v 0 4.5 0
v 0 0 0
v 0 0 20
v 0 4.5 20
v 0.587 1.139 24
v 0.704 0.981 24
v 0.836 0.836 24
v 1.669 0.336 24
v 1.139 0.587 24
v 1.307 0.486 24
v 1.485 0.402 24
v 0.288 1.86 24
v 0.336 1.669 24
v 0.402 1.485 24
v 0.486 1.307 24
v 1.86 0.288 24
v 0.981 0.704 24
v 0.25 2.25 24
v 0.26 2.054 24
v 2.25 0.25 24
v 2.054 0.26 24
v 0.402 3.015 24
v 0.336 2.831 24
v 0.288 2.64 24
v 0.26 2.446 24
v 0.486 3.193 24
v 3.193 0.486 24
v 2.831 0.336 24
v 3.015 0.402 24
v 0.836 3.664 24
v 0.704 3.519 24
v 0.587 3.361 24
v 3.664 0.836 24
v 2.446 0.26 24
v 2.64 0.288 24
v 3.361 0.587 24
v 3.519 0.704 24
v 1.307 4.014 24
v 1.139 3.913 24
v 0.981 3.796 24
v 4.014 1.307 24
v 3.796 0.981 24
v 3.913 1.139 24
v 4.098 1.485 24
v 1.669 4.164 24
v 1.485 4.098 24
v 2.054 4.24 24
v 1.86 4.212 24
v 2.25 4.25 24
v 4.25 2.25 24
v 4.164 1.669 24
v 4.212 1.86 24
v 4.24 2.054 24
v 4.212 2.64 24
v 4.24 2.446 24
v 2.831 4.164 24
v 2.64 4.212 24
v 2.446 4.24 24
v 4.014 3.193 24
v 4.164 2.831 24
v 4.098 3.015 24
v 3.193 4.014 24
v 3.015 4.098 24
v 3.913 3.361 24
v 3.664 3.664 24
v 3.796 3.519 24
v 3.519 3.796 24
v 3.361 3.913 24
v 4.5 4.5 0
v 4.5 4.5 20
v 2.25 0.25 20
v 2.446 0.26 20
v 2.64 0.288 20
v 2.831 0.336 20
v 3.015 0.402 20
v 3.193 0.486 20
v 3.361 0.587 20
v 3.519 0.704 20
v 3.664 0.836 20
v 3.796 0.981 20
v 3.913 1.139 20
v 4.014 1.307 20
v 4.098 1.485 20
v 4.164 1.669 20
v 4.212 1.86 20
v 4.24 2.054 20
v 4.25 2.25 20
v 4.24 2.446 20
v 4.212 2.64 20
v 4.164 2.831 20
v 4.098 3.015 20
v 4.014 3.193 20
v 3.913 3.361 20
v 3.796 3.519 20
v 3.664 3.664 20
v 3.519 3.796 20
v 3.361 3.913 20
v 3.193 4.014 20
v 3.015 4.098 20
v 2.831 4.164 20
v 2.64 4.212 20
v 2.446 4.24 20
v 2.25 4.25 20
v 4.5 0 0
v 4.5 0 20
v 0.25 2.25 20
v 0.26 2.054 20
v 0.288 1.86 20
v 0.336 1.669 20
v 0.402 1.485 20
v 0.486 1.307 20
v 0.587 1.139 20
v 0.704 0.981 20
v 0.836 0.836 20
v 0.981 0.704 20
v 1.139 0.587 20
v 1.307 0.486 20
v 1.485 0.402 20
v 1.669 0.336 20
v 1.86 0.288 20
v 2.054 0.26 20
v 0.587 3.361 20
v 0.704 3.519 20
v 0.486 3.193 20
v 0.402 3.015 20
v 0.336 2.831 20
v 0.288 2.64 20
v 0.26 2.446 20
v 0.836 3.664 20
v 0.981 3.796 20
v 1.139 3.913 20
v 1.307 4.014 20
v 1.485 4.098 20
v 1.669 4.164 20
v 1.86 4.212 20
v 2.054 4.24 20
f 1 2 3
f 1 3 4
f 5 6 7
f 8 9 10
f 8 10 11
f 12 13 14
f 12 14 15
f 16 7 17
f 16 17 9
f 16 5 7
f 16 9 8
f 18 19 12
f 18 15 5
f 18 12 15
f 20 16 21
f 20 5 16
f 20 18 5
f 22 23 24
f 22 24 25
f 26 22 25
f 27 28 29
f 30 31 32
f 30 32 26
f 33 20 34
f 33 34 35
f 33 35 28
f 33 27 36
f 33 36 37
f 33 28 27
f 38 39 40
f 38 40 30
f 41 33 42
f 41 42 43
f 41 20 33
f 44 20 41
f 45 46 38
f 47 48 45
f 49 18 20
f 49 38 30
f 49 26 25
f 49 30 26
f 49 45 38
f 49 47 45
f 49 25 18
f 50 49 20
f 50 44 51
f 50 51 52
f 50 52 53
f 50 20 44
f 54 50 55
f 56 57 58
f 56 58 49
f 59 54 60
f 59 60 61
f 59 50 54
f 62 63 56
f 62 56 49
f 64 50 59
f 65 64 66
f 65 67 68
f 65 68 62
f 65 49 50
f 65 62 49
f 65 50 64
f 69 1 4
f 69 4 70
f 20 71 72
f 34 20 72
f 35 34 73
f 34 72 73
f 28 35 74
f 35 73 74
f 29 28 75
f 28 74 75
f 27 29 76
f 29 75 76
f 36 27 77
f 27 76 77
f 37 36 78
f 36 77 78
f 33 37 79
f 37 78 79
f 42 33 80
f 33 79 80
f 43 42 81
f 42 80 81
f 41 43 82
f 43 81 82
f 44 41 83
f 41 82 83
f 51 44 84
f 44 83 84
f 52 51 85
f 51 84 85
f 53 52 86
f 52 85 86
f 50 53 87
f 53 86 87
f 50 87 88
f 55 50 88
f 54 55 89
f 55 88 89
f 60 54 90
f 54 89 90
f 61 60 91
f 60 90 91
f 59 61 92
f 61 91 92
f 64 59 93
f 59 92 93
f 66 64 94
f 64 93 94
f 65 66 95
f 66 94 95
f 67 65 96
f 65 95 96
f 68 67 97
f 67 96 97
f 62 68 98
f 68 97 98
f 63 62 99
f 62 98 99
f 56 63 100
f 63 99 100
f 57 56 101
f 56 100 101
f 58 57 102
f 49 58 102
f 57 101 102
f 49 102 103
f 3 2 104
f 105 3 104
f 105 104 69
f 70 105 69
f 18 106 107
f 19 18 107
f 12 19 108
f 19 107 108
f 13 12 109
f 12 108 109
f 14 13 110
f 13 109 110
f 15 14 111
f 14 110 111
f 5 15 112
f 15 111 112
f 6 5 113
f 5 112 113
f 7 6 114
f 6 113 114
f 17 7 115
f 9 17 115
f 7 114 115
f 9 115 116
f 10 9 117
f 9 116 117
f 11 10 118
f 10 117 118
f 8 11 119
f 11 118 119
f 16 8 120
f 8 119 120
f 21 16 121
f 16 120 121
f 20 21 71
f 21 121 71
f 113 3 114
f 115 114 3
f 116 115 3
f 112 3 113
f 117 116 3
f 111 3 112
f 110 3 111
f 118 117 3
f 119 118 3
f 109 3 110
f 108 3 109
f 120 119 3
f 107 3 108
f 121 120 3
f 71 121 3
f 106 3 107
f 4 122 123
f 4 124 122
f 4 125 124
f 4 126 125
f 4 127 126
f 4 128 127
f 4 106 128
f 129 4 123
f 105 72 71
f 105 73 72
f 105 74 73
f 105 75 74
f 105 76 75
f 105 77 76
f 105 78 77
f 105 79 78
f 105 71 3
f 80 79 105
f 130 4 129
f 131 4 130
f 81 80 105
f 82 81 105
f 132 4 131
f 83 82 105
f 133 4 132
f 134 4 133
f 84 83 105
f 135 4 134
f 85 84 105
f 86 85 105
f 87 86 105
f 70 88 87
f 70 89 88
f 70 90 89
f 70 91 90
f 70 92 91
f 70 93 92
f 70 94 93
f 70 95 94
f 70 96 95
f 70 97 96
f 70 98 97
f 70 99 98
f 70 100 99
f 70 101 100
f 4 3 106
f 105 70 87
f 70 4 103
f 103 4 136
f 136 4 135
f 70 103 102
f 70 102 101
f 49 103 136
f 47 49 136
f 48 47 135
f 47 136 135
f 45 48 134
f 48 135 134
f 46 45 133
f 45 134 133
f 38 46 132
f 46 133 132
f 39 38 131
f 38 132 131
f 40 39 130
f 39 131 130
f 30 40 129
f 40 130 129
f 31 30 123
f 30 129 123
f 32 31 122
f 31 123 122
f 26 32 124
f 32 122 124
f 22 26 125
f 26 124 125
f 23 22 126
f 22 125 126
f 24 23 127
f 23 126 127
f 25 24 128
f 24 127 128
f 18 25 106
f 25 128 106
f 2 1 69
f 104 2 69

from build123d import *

# Parameters (mm, degrees)
F0_W     = 4.5
F0_H     = 4.5
F1_DEPTH = 20
F3_DEPTH = 4


with BuildPart() as f1:
    # F0 (on Top) → F1 (new body)
    with BuildSketch(Plane.XY):
        with Locations((2.25, 2.25)):
            Rectangle(F0_W, F0_H)
    extrude(amount=F1_DEPTH)

    # F2 (on face) → F3 (join)
    with BuildSketch(Plane.XY.offset(20)):
        with BuildLine():
            Line((0.25, 2.25), (2.25, 2.25))
            Line((2.25, 2.25), (2.25, 4.25))
            ThreePointArc((2.25, 4.25), (0.8357864376, 3.6642135624), (0.25, 2.25))
        make_face()
        with BuildLine():
            Line((2.25, 2.25), (4.25, 2.25))
            ThreePointArc((4.25, 2.25), (3.6642135624, 3.6642135624), (2.25, 4.25))
            Line((2.25, 4.25), (2.25, 2.25))
        make_face()
        with BuildLine():
            ThreePointArc((2.25, 0.25), (3.6642135624, 0.8357864376), (4.25, 2.25))
            Line((4.25, 2.25), (2.25, 2.25))
            Line((2.25, 2.25), (2.25, 0.25))
        make_face()
        with BuildLine():
            Line((2.25, 0.25), (2.25, 2.25))
            Line((2.25, 2.25), (0.25, 2.25))
            ThreePointArc((0.25, 2.25), (0.8357864376, 0.8357864376), (2.25, 0.25))
        make_face()
    extrude(amount=F3_DEPTH)


solid = f1.part
